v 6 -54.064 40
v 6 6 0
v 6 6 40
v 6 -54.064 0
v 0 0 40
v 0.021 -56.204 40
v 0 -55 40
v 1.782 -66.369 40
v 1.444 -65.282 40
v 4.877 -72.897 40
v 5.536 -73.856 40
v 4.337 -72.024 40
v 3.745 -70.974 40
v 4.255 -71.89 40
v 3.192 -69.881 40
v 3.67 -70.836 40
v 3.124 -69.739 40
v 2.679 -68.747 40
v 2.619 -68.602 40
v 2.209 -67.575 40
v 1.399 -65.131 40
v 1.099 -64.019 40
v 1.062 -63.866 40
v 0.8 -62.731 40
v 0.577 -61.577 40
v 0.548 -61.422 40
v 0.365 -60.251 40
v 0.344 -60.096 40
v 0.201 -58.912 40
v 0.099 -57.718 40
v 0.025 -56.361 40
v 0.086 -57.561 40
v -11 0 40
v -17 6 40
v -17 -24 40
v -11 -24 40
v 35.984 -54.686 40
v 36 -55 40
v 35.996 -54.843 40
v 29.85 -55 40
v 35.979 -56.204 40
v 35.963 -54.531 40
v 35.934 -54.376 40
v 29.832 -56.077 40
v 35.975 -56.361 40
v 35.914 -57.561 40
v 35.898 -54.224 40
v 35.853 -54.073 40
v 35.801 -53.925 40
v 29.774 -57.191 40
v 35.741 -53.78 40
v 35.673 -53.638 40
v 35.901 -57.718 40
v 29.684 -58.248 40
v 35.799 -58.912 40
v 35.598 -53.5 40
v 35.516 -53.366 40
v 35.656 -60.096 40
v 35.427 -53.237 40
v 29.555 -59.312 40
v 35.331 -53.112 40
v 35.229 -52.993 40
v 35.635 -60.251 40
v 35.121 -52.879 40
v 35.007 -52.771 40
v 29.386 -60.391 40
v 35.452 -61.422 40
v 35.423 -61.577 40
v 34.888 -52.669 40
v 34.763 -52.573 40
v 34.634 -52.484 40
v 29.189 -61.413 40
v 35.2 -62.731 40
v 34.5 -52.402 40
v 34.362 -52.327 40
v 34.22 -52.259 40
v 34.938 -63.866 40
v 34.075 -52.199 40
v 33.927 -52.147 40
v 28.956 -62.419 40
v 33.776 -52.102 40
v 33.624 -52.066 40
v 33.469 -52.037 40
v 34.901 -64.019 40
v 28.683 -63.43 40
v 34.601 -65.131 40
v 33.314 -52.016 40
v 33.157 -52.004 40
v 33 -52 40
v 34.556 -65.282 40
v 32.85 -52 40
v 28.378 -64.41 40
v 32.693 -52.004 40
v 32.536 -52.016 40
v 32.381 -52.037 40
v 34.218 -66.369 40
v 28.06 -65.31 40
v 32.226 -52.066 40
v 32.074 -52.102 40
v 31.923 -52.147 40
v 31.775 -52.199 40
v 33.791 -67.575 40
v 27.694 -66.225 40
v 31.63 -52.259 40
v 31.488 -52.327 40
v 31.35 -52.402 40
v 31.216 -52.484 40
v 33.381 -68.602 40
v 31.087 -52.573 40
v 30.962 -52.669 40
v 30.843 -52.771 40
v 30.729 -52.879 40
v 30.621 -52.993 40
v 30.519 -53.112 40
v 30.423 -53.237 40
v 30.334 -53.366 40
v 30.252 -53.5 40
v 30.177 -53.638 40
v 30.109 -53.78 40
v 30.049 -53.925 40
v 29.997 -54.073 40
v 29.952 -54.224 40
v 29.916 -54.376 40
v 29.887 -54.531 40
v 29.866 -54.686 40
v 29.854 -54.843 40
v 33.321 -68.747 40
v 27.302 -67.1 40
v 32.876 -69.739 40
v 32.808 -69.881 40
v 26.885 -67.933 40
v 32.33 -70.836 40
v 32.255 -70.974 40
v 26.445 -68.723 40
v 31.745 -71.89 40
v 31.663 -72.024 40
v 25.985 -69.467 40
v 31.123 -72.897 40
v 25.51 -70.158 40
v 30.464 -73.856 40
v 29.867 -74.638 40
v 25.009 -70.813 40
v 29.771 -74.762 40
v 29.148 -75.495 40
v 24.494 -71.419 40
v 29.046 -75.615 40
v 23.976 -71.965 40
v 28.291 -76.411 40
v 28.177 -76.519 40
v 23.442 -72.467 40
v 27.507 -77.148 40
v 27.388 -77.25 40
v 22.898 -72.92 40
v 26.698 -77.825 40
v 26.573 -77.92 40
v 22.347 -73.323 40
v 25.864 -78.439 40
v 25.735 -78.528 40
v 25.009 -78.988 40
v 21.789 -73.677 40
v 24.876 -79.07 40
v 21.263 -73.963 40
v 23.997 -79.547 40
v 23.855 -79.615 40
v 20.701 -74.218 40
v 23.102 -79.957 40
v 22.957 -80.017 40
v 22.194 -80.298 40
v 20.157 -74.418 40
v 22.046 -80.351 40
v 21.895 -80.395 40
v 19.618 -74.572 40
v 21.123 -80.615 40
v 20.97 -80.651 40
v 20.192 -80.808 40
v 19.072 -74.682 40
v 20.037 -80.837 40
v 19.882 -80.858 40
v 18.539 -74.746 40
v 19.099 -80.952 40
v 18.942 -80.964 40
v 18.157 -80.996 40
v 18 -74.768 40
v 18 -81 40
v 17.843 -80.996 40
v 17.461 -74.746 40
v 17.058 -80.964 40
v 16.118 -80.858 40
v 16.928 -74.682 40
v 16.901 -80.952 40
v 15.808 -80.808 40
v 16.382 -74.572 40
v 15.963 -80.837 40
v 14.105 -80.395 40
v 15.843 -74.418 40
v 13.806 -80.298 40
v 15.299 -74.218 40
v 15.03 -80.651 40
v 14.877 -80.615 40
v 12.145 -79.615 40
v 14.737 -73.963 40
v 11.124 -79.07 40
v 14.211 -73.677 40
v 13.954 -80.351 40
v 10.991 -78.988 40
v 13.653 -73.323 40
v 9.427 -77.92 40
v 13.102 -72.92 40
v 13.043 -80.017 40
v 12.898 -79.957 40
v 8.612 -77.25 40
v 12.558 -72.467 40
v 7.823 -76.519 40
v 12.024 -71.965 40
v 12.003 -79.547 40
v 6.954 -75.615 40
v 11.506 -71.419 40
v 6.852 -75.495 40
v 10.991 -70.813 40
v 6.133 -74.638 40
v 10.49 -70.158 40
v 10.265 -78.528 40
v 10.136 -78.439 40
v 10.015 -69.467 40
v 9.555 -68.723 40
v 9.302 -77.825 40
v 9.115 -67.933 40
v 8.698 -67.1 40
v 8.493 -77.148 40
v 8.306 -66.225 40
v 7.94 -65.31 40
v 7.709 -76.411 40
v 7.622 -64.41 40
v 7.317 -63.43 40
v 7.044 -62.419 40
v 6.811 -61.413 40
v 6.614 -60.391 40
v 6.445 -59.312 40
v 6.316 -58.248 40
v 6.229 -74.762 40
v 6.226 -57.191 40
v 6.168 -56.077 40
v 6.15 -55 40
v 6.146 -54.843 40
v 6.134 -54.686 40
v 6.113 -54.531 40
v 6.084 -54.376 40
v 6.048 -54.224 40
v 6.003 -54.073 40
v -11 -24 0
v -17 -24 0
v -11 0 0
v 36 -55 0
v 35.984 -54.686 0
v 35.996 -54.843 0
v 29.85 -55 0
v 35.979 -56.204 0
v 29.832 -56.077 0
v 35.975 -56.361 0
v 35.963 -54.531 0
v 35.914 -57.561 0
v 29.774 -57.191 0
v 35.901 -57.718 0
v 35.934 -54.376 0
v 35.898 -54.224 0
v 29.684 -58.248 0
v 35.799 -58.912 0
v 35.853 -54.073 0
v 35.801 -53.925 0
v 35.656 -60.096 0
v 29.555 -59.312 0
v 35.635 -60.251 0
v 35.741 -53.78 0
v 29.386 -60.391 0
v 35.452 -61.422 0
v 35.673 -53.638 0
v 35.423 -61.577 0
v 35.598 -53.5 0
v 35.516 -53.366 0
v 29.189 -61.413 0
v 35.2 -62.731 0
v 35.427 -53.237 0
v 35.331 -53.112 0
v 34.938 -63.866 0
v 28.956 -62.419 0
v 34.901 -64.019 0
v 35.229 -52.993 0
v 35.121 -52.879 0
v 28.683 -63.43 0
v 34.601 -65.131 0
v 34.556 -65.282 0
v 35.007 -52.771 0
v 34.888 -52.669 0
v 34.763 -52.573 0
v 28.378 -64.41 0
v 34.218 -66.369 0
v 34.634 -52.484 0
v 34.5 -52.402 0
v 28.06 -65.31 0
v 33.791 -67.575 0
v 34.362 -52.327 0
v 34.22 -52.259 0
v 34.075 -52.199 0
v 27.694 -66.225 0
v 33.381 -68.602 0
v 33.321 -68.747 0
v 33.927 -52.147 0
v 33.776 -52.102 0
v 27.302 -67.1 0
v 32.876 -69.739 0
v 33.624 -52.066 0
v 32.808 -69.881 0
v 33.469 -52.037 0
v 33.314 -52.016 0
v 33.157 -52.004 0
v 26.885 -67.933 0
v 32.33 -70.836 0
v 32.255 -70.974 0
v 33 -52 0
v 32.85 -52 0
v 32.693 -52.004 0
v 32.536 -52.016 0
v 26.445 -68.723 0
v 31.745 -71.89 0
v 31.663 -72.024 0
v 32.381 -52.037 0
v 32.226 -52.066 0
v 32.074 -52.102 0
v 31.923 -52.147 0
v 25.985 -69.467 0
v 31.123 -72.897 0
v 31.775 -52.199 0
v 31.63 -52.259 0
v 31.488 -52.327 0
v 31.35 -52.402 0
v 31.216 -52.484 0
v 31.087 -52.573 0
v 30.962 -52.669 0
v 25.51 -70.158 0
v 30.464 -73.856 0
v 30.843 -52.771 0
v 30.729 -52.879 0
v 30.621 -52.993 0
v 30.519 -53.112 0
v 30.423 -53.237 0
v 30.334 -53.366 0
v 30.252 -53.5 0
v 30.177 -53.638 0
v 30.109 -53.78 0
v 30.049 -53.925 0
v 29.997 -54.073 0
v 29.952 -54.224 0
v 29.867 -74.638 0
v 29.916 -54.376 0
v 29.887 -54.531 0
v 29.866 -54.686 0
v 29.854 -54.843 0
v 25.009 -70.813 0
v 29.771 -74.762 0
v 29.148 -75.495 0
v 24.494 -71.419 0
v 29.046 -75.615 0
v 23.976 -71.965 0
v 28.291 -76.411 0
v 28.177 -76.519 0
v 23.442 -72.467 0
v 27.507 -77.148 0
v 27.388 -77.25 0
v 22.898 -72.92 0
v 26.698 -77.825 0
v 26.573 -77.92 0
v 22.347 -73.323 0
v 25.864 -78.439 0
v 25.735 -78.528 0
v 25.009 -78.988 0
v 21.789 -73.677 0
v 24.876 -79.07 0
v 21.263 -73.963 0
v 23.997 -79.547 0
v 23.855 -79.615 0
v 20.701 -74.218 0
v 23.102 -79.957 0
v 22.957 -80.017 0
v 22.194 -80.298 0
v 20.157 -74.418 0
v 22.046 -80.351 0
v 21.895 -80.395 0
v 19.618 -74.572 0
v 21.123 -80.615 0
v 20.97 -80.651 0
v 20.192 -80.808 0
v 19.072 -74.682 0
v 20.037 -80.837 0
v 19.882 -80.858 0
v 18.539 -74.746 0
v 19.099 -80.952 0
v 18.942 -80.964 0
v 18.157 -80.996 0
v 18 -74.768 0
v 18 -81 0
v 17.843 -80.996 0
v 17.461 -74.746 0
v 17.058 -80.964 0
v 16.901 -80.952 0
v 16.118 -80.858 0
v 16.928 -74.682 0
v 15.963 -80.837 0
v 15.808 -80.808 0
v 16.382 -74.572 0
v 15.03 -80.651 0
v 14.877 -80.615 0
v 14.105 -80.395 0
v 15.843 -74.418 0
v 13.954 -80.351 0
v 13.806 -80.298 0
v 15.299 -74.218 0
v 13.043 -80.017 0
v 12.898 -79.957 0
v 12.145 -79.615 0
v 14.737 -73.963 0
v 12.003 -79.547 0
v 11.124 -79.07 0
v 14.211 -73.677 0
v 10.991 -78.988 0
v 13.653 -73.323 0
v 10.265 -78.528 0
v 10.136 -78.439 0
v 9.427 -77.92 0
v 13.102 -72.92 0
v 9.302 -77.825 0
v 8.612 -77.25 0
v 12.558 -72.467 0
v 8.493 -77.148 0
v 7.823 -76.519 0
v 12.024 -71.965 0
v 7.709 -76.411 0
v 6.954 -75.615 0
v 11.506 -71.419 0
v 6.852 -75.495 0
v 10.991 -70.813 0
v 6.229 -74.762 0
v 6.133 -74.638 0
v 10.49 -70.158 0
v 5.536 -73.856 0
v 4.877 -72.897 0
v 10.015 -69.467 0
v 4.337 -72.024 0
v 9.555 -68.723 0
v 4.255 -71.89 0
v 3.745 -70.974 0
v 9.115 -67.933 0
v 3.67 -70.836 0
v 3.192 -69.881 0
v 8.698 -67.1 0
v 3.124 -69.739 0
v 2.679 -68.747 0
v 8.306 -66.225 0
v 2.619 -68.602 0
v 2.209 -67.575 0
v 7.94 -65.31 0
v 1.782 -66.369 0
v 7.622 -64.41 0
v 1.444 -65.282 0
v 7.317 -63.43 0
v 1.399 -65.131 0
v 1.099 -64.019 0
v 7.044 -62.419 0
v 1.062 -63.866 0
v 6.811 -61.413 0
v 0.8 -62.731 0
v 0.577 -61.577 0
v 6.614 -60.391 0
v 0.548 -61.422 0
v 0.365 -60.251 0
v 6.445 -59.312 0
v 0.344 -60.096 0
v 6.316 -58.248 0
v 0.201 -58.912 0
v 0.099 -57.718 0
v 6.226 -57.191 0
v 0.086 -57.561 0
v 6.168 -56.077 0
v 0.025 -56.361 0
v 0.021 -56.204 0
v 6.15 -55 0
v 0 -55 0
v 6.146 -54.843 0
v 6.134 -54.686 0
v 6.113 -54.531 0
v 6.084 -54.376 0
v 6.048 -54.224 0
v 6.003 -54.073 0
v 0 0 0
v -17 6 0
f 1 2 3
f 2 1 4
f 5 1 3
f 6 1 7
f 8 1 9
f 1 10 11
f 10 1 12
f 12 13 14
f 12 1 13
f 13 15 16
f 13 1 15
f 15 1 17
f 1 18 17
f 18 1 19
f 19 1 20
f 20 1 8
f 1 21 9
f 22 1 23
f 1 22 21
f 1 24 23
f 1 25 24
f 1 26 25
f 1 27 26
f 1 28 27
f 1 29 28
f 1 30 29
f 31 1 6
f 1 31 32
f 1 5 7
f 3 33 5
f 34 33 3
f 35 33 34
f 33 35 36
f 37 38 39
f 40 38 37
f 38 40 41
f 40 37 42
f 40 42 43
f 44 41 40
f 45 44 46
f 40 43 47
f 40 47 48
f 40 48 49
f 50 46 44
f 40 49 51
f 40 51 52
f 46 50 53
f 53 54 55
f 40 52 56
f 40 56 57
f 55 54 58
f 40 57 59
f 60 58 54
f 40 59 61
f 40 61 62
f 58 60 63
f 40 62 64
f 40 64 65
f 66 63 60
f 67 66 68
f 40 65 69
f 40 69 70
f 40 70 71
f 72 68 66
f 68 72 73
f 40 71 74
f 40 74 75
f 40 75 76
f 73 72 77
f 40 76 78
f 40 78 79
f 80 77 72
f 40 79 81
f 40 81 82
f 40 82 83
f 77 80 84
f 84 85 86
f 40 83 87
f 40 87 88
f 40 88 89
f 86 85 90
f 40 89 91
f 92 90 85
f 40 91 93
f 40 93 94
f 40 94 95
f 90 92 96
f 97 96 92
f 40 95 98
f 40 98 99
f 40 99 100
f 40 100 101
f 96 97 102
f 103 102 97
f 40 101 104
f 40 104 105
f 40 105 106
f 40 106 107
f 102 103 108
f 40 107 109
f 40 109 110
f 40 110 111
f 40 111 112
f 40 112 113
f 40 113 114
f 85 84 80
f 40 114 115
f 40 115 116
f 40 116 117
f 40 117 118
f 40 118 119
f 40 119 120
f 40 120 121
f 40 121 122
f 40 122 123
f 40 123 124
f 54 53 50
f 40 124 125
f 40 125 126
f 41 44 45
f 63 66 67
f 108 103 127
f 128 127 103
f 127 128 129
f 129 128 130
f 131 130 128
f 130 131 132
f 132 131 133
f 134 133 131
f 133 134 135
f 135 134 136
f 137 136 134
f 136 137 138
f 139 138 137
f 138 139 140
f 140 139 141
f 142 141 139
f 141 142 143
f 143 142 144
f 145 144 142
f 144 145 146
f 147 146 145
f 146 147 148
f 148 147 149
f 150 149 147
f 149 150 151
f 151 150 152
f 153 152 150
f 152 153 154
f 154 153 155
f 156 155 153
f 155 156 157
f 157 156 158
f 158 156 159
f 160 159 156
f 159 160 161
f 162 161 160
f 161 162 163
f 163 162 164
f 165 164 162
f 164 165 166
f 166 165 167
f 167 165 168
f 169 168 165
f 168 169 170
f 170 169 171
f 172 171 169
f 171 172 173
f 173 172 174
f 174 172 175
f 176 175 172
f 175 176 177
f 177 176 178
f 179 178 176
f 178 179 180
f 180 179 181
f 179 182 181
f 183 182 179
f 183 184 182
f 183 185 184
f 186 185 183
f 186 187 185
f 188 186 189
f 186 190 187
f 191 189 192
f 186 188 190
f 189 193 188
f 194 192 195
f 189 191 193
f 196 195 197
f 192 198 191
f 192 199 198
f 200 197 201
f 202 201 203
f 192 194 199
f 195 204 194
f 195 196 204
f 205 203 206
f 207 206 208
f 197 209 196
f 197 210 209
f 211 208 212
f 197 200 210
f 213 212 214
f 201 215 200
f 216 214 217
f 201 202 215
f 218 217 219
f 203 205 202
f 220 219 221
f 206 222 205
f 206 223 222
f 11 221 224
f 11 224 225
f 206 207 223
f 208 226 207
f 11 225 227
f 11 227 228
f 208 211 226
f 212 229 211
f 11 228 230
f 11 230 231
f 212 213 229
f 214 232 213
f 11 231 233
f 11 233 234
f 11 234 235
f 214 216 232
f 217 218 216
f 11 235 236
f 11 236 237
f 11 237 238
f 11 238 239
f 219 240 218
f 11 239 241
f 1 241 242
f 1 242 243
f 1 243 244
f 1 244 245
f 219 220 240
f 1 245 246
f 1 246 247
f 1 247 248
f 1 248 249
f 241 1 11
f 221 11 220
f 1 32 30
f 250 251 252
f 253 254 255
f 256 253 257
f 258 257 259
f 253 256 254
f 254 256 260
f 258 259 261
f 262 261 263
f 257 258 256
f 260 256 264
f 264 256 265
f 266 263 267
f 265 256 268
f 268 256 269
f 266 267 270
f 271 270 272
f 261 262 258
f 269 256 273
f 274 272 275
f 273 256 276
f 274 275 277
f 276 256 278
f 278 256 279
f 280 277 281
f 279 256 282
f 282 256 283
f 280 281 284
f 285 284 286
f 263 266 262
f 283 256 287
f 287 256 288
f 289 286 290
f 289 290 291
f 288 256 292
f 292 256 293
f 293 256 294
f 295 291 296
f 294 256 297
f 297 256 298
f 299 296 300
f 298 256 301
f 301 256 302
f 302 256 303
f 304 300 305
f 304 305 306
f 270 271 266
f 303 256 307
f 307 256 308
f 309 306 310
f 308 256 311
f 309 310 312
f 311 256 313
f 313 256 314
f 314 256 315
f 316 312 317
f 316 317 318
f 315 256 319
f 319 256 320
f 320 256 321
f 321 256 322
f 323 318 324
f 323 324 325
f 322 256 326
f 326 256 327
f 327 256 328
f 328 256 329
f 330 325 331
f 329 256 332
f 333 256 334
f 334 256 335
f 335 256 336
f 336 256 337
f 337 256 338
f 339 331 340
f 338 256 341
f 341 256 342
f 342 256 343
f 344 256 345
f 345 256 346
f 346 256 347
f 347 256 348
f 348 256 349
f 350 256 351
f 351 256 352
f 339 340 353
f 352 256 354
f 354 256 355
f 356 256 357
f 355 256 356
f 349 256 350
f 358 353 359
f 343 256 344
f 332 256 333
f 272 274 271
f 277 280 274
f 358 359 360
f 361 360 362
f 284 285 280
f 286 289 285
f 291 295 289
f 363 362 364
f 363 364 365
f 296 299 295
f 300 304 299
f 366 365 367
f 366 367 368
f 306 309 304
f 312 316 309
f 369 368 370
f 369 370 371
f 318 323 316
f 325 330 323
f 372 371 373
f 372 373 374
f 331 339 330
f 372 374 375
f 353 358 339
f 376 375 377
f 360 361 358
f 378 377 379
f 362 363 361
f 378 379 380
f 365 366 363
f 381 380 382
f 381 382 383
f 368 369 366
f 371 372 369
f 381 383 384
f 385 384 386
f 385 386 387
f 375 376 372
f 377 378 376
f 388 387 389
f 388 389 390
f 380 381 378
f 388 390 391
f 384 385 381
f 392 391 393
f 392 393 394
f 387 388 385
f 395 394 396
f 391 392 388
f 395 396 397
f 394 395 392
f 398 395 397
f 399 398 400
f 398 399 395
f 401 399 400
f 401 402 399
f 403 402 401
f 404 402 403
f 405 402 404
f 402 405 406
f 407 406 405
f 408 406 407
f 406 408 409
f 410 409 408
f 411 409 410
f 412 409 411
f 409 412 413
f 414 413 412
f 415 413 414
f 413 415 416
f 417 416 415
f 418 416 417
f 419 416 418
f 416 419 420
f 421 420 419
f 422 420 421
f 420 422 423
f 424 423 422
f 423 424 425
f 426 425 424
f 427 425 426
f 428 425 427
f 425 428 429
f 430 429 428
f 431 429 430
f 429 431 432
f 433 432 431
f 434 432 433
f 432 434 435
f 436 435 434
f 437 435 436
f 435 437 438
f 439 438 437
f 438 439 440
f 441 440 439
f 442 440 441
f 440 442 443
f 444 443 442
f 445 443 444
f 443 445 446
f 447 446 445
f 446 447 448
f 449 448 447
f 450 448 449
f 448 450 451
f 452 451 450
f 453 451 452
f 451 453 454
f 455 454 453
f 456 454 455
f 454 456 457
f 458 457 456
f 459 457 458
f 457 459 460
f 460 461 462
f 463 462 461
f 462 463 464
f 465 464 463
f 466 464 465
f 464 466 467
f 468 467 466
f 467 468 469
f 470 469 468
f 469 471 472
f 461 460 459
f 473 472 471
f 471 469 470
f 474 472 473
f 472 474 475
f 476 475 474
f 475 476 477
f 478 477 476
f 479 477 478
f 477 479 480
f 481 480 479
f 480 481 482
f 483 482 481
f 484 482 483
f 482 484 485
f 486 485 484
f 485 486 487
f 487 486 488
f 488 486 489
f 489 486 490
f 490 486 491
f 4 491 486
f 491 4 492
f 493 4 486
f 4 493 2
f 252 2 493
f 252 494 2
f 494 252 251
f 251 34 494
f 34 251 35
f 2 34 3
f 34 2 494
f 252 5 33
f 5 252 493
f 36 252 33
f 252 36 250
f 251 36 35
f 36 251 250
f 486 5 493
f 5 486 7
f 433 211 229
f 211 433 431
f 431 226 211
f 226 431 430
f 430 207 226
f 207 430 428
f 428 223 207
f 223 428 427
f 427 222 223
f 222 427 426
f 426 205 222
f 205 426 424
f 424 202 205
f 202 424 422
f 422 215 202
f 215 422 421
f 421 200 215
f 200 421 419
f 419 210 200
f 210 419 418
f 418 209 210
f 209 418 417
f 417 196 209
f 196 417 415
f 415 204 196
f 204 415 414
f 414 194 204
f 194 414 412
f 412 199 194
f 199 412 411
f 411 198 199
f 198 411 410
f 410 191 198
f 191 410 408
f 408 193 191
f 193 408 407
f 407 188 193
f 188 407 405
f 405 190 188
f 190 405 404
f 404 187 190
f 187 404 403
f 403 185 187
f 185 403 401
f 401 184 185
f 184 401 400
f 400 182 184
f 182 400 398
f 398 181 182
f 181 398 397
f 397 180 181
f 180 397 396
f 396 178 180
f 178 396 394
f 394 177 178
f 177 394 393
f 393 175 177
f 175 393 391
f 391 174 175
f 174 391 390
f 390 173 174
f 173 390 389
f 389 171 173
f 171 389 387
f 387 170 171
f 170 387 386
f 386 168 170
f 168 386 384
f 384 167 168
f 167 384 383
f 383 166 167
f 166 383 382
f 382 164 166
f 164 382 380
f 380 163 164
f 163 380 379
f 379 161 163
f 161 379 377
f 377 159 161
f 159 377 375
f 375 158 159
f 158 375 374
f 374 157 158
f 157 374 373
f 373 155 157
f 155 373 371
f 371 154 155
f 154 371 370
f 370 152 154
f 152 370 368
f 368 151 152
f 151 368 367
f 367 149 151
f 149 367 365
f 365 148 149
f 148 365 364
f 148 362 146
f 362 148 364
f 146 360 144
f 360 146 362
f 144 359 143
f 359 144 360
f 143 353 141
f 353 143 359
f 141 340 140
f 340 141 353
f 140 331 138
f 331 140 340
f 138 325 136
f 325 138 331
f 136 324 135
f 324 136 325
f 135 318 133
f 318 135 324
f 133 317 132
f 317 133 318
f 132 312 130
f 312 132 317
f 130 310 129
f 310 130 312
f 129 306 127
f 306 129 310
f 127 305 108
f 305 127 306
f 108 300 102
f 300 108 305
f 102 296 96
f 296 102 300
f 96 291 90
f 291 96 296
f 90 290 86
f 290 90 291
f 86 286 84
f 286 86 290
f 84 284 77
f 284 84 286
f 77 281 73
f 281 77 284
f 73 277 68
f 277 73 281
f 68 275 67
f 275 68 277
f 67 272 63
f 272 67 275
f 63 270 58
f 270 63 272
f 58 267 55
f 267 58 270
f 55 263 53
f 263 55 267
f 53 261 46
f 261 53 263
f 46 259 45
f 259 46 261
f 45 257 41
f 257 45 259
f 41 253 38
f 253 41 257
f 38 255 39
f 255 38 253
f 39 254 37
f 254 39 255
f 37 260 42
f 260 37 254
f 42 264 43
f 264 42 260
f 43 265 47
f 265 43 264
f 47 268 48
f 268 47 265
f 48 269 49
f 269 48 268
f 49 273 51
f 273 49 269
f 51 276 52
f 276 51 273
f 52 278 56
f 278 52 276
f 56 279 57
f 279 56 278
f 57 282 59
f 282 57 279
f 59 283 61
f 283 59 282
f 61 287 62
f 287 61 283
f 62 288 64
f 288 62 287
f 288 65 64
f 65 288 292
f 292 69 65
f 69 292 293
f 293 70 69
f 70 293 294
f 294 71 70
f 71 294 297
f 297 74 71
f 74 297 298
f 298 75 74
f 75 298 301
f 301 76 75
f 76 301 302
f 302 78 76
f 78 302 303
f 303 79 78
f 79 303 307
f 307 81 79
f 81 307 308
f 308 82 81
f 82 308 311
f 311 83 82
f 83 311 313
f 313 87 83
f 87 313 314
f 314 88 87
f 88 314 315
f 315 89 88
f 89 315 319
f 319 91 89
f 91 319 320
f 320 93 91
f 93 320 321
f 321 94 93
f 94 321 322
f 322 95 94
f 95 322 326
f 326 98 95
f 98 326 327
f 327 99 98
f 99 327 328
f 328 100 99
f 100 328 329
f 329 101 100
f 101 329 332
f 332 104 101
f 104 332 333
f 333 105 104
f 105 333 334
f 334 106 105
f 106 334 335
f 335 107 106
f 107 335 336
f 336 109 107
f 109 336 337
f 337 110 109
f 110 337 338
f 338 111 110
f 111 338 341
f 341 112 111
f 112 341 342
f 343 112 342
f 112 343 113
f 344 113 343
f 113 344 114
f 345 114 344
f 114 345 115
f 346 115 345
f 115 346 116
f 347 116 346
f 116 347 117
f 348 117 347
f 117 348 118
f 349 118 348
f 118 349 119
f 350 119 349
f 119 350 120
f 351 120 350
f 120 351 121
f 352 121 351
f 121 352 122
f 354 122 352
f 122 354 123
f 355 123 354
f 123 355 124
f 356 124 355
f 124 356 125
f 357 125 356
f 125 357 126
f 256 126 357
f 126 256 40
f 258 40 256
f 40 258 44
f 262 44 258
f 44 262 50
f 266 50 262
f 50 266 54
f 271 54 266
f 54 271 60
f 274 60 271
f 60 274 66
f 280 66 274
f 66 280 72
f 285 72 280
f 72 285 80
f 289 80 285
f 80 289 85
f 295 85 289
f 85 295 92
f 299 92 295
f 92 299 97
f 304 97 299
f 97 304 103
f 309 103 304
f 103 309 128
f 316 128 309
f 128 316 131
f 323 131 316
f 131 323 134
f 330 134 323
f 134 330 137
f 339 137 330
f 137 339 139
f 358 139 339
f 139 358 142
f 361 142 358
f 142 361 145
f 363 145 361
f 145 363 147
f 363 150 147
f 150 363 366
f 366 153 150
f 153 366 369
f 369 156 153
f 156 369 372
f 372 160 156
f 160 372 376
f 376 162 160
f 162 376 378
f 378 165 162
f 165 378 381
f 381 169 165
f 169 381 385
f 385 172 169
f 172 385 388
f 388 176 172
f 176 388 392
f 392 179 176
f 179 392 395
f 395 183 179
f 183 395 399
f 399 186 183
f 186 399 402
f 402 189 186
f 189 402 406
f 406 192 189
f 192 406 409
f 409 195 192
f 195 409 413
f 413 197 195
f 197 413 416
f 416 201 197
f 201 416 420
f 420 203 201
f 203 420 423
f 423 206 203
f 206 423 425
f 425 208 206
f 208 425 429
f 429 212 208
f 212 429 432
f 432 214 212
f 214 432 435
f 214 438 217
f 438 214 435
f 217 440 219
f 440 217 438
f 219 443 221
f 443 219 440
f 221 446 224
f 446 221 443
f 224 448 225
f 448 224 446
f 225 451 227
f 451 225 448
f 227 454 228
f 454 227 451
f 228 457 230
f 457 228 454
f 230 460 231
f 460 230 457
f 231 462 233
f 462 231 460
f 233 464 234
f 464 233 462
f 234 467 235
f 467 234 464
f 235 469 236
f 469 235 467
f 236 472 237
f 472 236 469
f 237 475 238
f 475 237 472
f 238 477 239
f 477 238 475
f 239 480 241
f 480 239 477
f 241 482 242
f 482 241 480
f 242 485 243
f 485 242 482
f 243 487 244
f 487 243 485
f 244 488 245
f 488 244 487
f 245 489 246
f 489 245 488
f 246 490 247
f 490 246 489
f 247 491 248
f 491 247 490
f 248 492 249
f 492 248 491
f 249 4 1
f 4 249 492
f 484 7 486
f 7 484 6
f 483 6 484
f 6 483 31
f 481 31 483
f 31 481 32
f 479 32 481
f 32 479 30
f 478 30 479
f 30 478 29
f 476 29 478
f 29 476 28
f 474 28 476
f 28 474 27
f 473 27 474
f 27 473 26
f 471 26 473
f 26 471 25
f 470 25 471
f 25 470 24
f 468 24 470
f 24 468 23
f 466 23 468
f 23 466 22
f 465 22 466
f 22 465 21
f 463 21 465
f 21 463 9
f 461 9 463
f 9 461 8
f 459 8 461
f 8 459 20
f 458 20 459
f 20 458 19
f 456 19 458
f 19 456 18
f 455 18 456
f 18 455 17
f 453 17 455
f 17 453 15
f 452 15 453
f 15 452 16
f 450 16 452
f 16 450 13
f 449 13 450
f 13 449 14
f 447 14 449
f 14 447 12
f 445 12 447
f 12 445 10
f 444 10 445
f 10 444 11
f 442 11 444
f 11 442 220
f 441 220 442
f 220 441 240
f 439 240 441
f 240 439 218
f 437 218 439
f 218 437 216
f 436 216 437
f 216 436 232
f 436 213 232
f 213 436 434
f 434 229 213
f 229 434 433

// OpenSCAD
$fn = 120;

top_hook_depth = 24;
top_hook_gap = 11;
bottom_hook_gap = 12;
bottom_hook_depth = 20;

height = 75;
width = 40;

thickness = 6;

main_bar_length = height - bottom_hook_depth + thickness;

// Top bar
color("red")
translate([-(top_hook_gap + thickness), 0, 0])
cube([thickness * 2 + top_hook_gap, thickness, width]);

// Top hook
color("green")
translate([-(top_hook_gap + thickness), -top_hook_depth, 0])
cube([thickness, thickness + top_hook_depth, width]);

// Main bar
color("blue")
translate([0, -(main_bar_length - thickness), 0])
cube([thickness, main_bar_length, width]);

// Bottom hook
color("yellow")
translate([bottom_hook_gap + thickness, -main_bar_length + thickness, 0])
linear_extrude(width) {
  minkowski() {
    intersection() {
        difference() {
            scale([bottom_hook_gap * 2 + thickness, bottom_hook_depth * 2 + thickness, 1]) {
                circle(d = 1);
            };
            scale([bottom_hook_gap * 2 + thickness, bottom_hook_depth * 2 + thickness, 1]) {
                circle(d = 0.99);
            };
        };
        translate([-50, -100])
        square([100, 100]);
    }
    circle(r = thickness / 2);
  }
};

/*
// Bottom hook
translate([thickness, -height + bottom_hook_gap, 0])
intersection() {
    scale([1, -1, 1])
    cube([bottom_hook_gap * 2, bottom_hook_gap * 2, width]);
    difference() {
        cylinder(r = bottom_hook_gap + thickness, h = width);
        cylinder(r = bottom_hook_gap, h = width);
    }
}
*/
